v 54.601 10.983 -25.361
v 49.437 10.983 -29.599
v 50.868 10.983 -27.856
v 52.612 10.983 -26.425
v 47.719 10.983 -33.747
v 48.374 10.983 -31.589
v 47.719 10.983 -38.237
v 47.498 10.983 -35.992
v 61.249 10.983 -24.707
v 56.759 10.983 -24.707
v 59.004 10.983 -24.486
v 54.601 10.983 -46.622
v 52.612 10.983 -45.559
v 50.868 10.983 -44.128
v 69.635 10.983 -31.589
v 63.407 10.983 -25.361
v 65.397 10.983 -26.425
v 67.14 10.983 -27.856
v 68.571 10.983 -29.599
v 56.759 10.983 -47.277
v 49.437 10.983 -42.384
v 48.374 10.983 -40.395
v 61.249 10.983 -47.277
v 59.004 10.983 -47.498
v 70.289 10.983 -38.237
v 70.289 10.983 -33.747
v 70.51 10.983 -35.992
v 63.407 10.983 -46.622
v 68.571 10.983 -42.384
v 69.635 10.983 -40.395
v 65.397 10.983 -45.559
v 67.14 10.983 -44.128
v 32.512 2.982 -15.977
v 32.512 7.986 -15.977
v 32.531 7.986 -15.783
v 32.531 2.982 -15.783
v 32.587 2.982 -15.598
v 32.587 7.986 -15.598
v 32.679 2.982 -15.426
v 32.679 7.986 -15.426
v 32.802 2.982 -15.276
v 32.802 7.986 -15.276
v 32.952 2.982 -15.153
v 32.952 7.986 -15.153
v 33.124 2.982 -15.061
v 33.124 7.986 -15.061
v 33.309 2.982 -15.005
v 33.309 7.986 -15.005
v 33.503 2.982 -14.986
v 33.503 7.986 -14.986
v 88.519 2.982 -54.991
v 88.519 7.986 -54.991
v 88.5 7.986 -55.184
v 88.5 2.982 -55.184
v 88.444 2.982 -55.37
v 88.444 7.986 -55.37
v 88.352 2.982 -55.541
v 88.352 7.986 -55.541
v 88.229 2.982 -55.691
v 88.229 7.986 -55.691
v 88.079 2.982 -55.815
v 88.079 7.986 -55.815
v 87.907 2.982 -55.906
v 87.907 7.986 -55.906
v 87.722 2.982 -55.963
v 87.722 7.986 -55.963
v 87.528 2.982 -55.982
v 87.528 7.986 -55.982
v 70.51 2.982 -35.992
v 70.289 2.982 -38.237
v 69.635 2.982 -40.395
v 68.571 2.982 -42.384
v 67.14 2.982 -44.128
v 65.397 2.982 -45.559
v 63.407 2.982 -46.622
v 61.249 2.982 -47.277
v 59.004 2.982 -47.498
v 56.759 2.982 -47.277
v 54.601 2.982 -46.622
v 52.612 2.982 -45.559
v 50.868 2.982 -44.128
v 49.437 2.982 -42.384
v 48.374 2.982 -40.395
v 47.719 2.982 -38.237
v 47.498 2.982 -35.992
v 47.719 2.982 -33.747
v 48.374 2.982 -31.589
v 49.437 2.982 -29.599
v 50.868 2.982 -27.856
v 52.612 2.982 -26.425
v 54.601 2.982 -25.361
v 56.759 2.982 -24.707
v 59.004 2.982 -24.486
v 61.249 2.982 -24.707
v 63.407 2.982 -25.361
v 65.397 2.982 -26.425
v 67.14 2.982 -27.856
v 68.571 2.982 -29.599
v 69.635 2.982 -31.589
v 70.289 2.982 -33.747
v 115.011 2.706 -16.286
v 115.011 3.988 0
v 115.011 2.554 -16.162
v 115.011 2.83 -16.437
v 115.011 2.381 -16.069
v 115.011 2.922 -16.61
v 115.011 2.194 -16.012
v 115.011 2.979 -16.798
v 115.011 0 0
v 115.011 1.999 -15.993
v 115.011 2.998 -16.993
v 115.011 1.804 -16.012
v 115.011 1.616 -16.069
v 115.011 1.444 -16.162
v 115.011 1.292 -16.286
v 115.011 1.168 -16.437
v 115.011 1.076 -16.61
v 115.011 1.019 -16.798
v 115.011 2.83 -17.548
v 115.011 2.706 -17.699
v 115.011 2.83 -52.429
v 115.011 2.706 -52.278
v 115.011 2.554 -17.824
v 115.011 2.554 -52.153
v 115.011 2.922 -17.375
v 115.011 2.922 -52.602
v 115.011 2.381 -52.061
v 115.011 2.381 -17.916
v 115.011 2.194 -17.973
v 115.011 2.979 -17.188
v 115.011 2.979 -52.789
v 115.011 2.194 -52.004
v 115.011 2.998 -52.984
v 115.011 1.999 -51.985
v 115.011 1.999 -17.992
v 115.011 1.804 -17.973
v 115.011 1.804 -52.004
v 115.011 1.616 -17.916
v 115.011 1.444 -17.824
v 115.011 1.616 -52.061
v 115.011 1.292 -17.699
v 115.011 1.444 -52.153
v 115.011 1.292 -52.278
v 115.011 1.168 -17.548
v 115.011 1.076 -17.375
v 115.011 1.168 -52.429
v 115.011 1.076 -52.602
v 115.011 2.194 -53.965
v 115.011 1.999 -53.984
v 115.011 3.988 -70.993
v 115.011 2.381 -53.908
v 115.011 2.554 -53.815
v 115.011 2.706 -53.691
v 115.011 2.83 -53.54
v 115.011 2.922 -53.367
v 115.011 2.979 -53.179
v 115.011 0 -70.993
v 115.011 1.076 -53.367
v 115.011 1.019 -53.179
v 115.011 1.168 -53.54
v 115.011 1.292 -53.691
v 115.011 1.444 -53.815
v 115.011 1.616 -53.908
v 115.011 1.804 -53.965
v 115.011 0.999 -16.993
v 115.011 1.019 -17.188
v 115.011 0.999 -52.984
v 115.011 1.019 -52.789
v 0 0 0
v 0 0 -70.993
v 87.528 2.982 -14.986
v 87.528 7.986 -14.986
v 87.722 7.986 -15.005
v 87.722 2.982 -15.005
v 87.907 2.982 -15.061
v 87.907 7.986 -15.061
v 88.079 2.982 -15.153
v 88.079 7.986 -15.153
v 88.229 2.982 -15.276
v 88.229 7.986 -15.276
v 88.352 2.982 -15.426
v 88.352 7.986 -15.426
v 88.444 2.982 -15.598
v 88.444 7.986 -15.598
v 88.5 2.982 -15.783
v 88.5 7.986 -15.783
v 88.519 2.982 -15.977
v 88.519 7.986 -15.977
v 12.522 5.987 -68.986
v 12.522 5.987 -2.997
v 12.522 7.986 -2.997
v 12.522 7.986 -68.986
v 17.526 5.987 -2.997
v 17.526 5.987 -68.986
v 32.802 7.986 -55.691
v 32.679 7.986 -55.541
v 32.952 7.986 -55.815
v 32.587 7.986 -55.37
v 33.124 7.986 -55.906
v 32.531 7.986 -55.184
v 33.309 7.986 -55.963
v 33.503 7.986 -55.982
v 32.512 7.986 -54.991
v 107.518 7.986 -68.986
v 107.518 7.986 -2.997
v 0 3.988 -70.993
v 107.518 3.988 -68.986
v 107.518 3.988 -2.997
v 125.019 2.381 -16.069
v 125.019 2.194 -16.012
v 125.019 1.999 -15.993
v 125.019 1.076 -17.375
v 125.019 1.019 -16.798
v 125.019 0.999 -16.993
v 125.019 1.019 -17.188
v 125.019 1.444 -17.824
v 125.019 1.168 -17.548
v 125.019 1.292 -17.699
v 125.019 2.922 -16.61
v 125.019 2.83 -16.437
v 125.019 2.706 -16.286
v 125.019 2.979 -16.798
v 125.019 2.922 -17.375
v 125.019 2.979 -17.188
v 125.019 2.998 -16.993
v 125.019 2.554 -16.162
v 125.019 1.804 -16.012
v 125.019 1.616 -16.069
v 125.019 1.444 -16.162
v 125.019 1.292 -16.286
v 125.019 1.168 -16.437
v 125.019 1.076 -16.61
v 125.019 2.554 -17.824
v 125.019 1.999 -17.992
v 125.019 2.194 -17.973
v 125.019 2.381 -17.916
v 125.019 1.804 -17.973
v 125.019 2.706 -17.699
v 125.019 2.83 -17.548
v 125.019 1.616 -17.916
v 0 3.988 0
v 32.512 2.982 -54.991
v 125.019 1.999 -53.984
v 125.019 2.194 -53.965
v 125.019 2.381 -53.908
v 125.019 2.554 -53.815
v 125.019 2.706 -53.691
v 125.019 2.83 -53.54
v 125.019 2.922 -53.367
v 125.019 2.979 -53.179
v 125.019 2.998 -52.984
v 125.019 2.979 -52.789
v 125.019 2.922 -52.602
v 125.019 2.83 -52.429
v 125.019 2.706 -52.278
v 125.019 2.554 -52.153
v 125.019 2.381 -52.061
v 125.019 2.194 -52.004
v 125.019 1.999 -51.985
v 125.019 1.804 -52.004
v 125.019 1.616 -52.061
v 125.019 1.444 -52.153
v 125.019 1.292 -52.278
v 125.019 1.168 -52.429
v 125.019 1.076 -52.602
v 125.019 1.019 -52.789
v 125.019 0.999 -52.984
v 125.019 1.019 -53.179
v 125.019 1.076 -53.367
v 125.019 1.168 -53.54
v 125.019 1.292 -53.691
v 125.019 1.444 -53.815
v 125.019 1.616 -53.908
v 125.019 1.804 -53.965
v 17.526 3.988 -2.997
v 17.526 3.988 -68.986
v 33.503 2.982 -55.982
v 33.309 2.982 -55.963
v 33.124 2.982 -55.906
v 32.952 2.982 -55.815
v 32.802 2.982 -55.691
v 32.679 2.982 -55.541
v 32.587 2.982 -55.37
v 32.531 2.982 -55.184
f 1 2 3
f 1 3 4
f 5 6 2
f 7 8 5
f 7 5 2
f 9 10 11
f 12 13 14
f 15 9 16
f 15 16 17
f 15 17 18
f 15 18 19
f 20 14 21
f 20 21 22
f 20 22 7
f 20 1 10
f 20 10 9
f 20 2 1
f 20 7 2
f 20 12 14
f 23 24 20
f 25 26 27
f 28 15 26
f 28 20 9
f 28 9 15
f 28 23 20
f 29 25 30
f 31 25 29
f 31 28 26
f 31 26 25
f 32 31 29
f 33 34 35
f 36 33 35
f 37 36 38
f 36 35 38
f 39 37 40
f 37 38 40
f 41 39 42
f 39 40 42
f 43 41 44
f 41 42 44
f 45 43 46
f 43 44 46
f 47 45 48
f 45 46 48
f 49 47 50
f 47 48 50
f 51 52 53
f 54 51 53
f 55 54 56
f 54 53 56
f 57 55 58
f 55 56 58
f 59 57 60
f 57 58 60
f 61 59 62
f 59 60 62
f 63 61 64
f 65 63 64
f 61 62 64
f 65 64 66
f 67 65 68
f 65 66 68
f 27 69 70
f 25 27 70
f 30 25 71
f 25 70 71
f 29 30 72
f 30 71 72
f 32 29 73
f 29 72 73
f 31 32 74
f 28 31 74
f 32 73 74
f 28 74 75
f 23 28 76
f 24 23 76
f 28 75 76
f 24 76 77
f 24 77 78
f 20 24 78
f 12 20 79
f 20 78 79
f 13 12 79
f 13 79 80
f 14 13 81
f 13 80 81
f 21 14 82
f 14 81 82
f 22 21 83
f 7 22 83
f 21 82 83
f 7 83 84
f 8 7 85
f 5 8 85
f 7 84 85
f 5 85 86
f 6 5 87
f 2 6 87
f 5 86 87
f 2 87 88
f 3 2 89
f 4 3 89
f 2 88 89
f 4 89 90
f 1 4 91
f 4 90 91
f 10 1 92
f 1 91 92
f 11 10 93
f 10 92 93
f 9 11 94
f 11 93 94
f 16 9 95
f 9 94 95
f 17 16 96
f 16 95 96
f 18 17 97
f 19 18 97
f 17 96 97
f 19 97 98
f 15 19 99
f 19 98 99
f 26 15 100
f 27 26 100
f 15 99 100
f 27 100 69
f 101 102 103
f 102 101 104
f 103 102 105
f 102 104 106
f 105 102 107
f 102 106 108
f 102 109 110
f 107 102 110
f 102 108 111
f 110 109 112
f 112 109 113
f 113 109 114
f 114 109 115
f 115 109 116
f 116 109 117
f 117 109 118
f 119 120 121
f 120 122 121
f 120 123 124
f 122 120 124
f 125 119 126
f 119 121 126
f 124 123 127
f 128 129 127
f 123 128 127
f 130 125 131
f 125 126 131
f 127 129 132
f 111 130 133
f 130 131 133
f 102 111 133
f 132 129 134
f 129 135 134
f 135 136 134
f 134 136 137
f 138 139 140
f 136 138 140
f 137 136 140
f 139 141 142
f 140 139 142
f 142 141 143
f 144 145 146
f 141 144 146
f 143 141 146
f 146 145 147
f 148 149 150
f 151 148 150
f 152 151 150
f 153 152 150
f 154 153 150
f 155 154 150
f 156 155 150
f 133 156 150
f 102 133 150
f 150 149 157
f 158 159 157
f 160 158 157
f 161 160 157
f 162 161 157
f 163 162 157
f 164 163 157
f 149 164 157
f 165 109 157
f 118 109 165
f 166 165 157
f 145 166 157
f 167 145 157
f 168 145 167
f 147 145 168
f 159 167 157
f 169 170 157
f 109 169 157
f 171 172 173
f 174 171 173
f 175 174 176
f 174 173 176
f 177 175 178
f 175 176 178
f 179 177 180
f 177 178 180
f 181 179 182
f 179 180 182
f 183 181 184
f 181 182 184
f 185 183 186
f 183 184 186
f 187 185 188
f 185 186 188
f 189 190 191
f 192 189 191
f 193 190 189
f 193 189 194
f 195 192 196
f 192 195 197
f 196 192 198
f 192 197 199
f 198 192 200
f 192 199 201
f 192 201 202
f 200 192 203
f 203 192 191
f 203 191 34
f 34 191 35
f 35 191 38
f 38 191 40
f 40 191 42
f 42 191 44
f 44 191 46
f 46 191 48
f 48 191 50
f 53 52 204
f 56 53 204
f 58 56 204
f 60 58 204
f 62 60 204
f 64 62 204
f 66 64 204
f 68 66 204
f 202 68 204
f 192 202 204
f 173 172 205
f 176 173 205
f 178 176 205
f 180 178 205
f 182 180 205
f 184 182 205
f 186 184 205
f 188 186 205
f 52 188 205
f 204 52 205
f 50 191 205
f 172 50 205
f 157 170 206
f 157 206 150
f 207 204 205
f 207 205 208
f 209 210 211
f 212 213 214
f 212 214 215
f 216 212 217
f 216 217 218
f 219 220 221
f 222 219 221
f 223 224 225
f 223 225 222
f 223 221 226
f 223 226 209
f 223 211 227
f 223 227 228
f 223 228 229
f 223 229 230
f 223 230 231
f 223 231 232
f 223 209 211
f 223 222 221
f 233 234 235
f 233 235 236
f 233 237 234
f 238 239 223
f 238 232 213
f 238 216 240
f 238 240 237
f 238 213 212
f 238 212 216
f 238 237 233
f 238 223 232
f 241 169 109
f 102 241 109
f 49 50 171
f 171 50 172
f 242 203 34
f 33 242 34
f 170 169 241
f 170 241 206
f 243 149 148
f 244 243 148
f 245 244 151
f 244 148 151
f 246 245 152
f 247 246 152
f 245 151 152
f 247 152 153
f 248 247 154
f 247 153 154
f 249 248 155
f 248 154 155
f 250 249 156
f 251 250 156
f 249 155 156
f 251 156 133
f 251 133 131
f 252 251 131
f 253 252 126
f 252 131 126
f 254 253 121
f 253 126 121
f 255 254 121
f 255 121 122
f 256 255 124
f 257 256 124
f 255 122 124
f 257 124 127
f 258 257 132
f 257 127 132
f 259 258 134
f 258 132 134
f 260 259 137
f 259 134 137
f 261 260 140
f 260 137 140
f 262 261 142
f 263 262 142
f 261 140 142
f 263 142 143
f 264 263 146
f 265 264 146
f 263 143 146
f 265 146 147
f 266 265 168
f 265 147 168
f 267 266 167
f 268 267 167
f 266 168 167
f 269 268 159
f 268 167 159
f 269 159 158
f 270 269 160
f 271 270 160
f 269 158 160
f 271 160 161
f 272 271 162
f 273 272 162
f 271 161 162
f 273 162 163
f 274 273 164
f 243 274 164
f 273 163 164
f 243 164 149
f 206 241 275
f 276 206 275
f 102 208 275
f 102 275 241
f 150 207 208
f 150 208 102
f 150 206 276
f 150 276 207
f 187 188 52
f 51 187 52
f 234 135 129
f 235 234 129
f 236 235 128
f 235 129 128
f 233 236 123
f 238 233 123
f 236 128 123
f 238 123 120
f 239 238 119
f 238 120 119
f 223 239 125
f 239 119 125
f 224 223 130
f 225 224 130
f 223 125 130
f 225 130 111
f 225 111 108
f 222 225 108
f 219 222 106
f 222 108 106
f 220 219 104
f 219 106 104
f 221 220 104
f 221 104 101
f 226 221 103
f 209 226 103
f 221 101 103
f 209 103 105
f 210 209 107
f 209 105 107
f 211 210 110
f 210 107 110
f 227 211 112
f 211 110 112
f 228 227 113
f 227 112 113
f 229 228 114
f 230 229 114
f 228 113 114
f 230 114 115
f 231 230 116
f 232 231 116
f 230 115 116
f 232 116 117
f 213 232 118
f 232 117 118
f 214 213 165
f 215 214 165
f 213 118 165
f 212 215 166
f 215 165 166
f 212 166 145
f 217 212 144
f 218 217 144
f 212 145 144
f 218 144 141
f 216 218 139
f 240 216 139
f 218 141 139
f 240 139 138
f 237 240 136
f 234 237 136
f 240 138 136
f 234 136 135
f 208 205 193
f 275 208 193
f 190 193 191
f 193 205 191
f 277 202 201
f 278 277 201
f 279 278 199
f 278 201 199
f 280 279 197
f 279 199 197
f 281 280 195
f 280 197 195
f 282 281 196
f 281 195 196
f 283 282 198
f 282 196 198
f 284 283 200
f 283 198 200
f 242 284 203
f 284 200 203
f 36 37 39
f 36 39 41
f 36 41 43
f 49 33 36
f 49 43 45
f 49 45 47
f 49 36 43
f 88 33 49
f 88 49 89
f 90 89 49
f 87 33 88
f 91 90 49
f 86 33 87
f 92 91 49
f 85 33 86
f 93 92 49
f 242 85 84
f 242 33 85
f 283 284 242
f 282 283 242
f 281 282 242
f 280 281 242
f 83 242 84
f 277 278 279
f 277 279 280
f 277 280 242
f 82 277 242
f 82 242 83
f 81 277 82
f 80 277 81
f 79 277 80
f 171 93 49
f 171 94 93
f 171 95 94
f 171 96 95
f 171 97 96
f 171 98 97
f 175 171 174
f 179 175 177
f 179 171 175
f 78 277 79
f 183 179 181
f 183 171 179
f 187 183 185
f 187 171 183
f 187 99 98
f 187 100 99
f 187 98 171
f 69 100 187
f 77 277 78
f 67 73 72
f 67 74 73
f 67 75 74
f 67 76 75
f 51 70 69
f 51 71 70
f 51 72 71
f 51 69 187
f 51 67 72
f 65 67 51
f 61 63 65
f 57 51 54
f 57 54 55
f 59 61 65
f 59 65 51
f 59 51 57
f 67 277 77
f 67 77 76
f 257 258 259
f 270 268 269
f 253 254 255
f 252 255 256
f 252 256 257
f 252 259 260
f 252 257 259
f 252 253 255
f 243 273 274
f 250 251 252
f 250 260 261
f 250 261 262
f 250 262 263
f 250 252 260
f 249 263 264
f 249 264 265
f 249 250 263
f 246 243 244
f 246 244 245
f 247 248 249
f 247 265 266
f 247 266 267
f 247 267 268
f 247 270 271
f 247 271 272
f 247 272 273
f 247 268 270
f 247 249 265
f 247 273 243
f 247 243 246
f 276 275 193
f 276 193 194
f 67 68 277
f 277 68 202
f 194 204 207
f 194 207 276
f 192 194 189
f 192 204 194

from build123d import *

# Parameters (mm, degrees)
SKETCH1_W           = 115.0112
SKETCH1_H           = 70.993
BOSS_EXTRUDE1_DEPTH = 3.9878
SKETCH2_W           = 89.9922
SKETCH2_H           = 65.9892
BOSS_EXTRUDE2_DEPTH = 1.99898
BOSS_EXTRUDE3_DEPTH = 65.9892
CUT_EXTRUDE1_DEPTH  = 5.0038
SKETCH5_R           = 11.5062
BOSS_EXTRUDE4_DEPTH = 8.001
SKETCH6_R           = 0.99949
BOSS_EXTRUDE5_DEPTH = 10.0076


with BuildPart() as part:
    # Sketch1 → Boss-Extrude1 (new body)
    with BuildSketch(Plane(origin=(0, 0, 0), x_dir=(1, 0, 0), z_dir=(0, 1, 0))):
        with Locations((57.5056, 35.4965)):
            Rectangle(SKETCH1_W, SKETCH1_H)
    extrude(amount=BOSS_EXTRUDE1_DEPTH)

    # Sketch2 → Boss-Extrude2 (add)
    with BuildSketch(Plane(origin=(0, 3.9878, 0), x_dir=(1, 0, 0), z_dir=(0, 1, 0))):
        with Locations((62.5221, 35.9918)):
            Rectangle(SKETCH2_W, SKETCH2_H)
    extrude(amount=BOSS_EXTRUDE2_DEPTH)

    # Sketch3 → Boss-Extrude3 (add)
    with BuildSketch(Plane.XY.offset(-2.9972)):
        Polygon((17.526, 5.98678), (12.5222, 5.98678), (12.5222, 7.98576), (107.5182, 7.98576), (107.5182, 5.98678), align=None)
    extrude(amount=-BOSS_EXTRUDE3_DEPTH)

    # Sketch4 → Cut-Extrude1 (cut)
    with BuildSketch(Plane(origin=(0, 7.98576, 0), x_dir=(1, 0, 0), z_dir=(0, 1, 0))):
        with BuildLine():
            Line((33.5026, 14.986), (87.5284, 14.986))
            ThreePointArc((87.5284, 14.986), (88.228859977, 15.276140023), (88.519, 15.9766))
            Line((88.519, 15.9766), (88.519, 54.991))
            ThreePointArc((88.519, 54.991), (88.228859977, 55.691459977), (87.5284, 55.9816))
            Line((87.5284, 55.9816), (33.5026, 55.9816))
            ThreePointArc((33.5026, 55.9816), (32.802140023, 55.691459977), (32.512, 54.991))
            Line((32.512, 54.991), (32.512, 15.9766))
            ThreePointArc((32.512, 15.9766), (32.802140023, 15.276140023), (33.5026, 14.986))
        make_face()
    extrude(amount=-CUT_EXTRUDE1_DEPTH, mode=Mode.SUBTRACT)

    # Sketch5 → Boss-Extrude4 (add)
    with BuildSketch(Plane(origin=(0, 2.98196, 0), x_dir=(1, 0, 0), z_dir=(0, 1, 0))):
        with Locations((59.0042, 35.9918)):
            Circle(SKETCH5_R)
    extrude(amount=BOSS_EXTRUDE4_DEPTH)

    # Sketch6 → Boss-Extrude5 (add)
    with BuildSketch(Plane(origin=(115.0112, 0, 0), x_dir=(0, 0, -1), z_dir=(1, 0, 0))):
        with Locations((16.9926, 1.99898)):
            Circle(SKETCH6_R)
        with Locations((52.9844, 1.99898)):
            Circle(SKETCH6_R)
    extrude(amount=BOSS_EXTRUDE5_DEPTH)


solid = part.part
